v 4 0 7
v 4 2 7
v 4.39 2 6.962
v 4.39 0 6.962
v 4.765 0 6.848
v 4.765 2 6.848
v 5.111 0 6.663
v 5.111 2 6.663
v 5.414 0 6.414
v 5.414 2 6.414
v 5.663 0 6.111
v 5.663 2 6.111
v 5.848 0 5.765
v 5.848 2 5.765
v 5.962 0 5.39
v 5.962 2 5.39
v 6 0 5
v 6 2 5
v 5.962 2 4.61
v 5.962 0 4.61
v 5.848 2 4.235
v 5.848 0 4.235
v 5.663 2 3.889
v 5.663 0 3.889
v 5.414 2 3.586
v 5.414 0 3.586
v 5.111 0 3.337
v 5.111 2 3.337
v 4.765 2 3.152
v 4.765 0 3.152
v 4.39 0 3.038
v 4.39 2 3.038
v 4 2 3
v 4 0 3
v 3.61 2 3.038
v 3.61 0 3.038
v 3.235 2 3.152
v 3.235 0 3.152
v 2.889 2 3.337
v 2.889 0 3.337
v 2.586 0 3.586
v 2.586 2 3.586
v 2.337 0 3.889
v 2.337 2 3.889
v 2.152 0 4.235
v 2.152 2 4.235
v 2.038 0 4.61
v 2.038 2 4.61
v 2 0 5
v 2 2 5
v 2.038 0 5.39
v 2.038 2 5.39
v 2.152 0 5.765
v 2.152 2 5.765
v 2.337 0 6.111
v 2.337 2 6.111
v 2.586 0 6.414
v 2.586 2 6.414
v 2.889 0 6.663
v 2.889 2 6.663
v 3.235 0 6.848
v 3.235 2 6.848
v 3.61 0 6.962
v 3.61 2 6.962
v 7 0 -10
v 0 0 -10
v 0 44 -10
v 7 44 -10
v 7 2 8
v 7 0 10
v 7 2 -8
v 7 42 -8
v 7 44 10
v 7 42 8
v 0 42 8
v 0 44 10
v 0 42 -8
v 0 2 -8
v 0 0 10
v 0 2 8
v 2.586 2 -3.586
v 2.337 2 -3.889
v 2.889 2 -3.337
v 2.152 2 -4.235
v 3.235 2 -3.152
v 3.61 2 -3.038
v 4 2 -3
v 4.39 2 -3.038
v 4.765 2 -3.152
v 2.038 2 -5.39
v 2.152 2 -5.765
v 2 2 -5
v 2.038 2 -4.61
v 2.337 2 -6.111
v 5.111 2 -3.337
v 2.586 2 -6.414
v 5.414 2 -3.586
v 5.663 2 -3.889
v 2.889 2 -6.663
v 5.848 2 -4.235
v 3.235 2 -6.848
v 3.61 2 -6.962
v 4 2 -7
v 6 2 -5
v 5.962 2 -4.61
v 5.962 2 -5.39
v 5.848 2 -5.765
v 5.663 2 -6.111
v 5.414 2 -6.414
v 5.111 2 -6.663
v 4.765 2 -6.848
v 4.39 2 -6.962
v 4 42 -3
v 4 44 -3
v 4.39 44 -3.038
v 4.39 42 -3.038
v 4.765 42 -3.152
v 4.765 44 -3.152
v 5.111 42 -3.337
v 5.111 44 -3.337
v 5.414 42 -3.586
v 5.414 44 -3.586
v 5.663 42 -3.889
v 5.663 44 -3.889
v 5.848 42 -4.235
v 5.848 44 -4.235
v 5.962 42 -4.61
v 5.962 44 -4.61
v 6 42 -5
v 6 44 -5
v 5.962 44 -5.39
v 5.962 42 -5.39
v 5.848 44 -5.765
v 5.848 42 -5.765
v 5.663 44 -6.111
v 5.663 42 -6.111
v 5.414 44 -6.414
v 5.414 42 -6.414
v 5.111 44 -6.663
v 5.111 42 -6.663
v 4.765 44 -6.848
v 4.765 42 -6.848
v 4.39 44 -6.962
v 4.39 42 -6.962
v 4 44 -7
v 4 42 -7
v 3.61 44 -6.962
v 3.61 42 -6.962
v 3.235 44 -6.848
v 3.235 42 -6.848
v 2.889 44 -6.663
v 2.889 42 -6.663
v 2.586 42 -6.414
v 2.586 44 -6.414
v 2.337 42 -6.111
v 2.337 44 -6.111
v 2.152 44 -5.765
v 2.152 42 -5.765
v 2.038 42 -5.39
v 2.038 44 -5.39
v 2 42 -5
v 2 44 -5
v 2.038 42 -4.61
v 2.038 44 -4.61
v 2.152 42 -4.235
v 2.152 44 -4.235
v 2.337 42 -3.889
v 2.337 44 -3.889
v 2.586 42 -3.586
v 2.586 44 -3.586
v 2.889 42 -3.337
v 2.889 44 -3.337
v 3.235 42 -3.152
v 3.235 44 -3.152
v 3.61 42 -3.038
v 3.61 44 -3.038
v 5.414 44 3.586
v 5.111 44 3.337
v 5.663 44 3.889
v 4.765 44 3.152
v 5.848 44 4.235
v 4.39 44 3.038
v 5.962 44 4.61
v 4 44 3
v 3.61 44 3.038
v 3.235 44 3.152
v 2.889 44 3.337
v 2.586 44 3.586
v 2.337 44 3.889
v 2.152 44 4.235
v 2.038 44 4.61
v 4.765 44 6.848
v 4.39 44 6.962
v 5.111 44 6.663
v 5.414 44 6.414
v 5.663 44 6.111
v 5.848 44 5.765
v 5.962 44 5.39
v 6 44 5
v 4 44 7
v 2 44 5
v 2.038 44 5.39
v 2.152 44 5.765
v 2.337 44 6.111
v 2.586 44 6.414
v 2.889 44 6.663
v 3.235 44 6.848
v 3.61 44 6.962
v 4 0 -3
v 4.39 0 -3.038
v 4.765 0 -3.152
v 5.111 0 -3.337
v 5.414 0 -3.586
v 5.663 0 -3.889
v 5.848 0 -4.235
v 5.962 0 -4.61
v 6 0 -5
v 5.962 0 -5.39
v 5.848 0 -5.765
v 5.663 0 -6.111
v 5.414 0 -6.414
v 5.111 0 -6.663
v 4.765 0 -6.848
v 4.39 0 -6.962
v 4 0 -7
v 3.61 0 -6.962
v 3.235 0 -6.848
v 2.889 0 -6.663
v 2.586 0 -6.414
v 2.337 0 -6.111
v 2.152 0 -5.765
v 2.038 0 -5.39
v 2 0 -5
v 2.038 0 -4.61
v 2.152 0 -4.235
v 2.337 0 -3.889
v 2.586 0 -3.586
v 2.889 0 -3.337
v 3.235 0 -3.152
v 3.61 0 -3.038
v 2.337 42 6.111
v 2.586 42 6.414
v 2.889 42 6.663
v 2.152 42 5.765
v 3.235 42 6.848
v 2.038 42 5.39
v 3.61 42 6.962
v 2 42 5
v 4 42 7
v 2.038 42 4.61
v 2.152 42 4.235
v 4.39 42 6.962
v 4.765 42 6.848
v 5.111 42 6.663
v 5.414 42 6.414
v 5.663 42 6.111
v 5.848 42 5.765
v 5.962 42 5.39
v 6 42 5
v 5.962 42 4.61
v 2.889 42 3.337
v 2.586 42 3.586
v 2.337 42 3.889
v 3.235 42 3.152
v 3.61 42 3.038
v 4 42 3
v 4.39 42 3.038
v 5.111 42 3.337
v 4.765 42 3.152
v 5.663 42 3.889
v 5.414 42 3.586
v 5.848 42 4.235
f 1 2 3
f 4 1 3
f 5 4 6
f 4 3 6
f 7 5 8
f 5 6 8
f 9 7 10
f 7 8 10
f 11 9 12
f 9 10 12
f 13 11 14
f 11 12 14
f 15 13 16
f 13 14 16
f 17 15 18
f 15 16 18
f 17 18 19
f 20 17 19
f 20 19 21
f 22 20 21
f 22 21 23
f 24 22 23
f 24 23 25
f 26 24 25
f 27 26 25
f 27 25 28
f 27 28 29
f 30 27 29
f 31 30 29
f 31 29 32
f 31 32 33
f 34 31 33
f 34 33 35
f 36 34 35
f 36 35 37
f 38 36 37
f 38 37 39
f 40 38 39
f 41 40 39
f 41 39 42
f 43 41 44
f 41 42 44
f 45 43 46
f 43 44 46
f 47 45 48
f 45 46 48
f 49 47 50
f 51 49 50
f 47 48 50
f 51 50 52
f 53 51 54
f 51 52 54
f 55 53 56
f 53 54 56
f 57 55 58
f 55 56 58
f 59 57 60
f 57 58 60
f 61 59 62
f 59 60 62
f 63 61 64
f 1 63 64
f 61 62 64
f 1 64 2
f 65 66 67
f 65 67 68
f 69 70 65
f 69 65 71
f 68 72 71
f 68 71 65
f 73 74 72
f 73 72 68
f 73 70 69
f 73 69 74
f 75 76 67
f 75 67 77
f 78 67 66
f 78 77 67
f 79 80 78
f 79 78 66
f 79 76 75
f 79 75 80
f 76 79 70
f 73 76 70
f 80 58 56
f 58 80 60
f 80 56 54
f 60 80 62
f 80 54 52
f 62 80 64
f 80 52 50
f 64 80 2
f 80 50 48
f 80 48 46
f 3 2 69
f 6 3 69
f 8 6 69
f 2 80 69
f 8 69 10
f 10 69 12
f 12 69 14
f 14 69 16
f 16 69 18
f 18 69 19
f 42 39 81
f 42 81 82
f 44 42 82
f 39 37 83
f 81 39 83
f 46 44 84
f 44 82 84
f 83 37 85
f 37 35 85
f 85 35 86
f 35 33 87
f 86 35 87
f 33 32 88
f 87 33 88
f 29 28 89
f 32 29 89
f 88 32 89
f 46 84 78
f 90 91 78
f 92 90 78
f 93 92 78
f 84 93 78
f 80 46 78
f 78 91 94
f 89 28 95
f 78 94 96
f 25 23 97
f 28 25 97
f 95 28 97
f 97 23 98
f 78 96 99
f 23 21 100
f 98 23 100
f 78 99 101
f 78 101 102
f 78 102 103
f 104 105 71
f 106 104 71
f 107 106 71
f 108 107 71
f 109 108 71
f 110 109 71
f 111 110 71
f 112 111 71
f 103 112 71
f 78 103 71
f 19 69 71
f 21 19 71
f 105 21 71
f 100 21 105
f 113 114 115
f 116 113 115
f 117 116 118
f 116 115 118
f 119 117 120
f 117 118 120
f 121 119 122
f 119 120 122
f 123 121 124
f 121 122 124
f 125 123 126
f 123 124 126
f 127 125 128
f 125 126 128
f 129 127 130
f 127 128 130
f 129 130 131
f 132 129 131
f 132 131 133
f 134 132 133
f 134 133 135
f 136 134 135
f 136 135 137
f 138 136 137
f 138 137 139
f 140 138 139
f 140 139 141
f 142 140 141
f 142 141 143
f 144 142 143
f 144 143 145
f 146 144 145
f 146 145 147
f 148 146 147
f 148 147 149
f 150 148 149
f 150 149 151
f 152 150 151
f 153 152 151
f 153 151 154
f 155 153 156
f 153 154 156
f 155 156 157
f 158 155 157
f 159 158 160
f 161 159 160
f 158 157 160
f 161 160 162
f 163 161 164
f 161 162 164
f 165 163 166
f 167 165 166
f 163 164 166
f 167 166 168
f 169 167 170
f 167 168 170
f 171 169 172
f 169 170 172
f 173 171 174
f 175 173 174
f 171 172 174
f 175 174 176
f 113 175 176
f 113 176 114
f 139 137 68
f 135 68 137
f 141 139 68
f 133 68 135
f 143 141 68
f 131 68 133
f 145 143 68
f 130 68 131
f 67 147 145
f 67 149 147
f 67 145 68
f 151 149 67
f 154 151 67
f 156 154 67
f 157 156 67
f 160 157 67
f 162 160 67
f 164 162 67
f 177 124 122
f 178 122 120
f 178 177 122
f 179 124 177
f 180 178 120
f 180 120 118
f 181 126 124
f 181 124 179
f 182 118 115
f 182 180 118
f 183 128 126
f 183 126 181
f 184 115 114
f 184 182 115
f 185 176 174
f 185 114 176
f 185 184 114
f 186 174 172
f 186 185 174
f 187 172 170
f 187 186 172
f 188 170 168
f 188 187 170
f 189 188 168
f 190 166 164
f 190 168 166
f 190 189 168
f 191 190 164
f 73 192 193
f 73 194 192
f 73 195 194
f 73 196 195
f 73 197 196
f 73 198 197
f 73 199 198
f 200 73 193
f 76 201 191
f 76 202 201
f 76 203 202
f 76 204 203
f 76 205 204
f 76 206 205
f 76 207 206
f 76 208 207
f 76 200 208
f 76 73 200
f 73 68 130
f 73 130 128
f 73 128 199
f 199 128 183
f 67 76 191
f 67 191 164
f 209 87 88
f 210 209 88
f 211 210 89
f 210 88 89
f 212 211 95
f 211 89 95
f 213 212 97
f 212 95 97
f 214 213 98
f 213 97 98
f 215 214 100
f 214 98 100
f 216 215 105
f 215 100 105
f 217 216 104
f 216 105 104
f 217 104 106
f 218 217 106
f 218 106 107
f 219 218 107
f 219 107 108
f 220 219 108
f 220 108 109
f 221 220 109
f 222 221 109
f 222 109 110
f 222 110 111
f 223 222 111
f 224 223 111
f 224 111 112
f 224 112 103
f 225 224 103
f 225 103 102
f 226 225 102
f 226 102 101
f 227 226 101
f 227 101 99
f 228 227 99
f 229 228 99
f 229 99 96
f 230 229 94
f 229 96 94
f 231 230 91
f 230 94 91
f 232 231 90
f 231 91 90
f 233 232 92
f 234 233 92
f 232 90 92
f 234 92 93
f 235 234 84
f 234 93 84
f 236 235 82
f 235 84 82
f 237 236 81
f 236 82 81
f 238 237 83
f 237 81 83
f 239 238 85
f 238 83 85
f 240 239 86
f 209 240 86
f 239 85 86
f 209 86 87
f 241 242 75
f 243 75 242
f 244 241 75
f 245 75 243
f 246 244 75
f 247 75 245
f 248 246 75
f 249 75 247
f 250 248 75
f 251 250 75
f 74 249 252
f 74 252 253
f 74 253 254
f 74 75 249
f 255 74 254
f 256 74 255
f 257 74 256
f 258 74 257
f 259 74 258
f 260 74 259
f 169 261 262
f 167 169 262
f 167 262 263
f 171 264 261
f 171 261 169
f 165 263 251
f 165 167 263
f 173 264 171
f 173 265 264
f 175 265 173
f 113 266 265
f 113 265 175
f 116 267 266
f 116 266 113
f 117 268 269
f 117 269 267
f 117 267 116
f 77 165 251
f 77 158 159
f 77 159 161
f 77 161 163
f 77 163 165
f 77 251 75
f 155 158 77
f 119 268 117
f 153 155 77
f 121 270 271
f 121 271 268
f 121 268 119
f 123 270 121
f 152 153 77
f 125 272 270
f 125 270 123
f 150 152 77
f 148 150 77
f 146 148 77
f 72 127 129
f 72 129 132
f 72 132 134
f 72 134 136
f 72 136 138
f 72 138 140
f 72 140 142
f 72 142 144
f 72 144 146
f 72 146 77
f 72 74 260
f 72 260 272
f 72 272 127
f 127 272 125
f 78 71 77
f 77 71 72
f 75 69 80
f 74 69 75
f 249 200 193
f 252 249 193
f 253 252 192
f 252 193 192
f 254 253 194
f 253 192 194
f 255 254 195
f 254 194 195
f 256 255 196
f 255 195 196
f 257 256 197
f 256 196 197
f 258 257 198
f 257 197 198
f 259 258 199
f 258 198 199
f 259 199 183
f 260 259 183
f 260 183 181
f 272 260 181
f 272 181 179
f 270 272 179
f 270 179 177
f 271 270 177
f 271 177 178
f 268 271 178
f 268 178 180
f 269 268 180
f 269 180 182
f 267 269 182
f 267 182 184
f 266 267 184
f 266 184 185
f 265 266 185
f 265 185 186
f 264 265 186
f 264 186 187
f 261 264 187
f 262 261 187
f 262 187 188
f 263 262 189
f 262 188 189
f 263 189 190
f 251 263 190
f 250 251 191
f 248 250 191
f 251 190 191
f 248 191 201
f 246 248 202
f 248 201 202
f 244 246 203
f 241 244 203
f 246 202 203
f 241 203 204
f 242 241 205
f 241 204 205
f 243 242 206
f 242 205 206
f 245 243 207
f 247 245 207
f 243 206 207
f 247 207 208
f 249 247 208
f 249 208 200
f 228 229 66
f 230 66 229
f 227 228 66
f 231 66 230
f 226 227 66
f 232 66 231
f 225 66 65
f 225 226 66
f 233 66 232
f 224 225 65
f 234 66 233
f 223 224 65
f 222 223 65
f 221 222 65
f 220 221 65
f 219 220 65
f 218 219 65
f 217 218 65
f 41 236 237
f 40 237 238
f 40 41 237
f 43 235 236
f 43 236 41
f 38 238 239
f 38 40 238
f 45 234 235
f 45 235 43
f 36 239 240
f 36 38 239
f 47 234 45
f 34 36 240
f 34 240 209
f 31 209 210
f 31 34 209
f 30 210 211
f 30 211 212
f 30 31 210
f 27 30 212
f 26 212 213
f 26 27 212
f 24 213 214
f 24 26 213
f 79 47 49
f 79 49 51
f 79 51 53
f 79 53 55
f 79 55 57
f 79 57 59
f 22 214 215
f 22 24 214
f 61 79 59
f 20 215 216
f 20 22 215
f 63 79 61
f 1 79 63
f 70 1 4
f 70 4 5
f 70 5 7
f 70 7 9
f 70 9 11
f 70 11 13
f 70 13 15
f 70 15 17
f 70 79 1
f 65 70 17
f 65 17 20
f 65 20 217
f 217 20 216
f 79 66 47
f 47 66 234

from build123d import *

# Parameters (mm, degrees)
EXTRUDE_1_DEPTH     = 10
SKETCH_2_W          = 16
SKETCH_2_H          = 40
CUT_EXTRUDE_1_DEPTH = 10
SKETCH_3_R          = 2
CUT_EXTRUDE_2_DEPTH = 50


with BuildPart() as part:
    # 草图1 → 凸台-拉伸1 (new, symmetric)
    with BuildSketch(Plane.XY):
        Polygon((0, 42), (0, 2), (0, 0), (7, 0), (7, 44), (0, 44), align=None)
    extrude(amount=EXTRUDE_1_DEPTH, both=True)

    # 草图2 → 切除-拉伸1 (cut, symmetric)
    with BuildSketch(Plane(origin=(7, 0, 0), x_dir=(0, 0, -1), z_dir=(1, 0, 0))):
        with Locations((0, 22)):
            Rectangle(SKETCH_2_W, SKETCH_2_H)
    extrude(amount=CUT_EXTRUDE_1_DEPTH, both=True, mode=Mode.SUBTRACT)

    # 草图3 → 切除-拉伸2 (cut)
    with BuildSketch(Plane(origin=(0, 44, 0), x_dir=(1, 0, 0), z_dir=(0, 1, 0))):
        with Locations(Location((4, 5, 0), (0, 0, 270))):
            Circle(SKETCH_3_R)
        with Locations(Location((4, -5, 0), (0, 0, 270))):
            Circle(SKETCH_3_R)
    extrude(amount=-CUT_EXTRUDE_2_DEPTH, mode=Mode.SUBTRACT)


solid = part.part
